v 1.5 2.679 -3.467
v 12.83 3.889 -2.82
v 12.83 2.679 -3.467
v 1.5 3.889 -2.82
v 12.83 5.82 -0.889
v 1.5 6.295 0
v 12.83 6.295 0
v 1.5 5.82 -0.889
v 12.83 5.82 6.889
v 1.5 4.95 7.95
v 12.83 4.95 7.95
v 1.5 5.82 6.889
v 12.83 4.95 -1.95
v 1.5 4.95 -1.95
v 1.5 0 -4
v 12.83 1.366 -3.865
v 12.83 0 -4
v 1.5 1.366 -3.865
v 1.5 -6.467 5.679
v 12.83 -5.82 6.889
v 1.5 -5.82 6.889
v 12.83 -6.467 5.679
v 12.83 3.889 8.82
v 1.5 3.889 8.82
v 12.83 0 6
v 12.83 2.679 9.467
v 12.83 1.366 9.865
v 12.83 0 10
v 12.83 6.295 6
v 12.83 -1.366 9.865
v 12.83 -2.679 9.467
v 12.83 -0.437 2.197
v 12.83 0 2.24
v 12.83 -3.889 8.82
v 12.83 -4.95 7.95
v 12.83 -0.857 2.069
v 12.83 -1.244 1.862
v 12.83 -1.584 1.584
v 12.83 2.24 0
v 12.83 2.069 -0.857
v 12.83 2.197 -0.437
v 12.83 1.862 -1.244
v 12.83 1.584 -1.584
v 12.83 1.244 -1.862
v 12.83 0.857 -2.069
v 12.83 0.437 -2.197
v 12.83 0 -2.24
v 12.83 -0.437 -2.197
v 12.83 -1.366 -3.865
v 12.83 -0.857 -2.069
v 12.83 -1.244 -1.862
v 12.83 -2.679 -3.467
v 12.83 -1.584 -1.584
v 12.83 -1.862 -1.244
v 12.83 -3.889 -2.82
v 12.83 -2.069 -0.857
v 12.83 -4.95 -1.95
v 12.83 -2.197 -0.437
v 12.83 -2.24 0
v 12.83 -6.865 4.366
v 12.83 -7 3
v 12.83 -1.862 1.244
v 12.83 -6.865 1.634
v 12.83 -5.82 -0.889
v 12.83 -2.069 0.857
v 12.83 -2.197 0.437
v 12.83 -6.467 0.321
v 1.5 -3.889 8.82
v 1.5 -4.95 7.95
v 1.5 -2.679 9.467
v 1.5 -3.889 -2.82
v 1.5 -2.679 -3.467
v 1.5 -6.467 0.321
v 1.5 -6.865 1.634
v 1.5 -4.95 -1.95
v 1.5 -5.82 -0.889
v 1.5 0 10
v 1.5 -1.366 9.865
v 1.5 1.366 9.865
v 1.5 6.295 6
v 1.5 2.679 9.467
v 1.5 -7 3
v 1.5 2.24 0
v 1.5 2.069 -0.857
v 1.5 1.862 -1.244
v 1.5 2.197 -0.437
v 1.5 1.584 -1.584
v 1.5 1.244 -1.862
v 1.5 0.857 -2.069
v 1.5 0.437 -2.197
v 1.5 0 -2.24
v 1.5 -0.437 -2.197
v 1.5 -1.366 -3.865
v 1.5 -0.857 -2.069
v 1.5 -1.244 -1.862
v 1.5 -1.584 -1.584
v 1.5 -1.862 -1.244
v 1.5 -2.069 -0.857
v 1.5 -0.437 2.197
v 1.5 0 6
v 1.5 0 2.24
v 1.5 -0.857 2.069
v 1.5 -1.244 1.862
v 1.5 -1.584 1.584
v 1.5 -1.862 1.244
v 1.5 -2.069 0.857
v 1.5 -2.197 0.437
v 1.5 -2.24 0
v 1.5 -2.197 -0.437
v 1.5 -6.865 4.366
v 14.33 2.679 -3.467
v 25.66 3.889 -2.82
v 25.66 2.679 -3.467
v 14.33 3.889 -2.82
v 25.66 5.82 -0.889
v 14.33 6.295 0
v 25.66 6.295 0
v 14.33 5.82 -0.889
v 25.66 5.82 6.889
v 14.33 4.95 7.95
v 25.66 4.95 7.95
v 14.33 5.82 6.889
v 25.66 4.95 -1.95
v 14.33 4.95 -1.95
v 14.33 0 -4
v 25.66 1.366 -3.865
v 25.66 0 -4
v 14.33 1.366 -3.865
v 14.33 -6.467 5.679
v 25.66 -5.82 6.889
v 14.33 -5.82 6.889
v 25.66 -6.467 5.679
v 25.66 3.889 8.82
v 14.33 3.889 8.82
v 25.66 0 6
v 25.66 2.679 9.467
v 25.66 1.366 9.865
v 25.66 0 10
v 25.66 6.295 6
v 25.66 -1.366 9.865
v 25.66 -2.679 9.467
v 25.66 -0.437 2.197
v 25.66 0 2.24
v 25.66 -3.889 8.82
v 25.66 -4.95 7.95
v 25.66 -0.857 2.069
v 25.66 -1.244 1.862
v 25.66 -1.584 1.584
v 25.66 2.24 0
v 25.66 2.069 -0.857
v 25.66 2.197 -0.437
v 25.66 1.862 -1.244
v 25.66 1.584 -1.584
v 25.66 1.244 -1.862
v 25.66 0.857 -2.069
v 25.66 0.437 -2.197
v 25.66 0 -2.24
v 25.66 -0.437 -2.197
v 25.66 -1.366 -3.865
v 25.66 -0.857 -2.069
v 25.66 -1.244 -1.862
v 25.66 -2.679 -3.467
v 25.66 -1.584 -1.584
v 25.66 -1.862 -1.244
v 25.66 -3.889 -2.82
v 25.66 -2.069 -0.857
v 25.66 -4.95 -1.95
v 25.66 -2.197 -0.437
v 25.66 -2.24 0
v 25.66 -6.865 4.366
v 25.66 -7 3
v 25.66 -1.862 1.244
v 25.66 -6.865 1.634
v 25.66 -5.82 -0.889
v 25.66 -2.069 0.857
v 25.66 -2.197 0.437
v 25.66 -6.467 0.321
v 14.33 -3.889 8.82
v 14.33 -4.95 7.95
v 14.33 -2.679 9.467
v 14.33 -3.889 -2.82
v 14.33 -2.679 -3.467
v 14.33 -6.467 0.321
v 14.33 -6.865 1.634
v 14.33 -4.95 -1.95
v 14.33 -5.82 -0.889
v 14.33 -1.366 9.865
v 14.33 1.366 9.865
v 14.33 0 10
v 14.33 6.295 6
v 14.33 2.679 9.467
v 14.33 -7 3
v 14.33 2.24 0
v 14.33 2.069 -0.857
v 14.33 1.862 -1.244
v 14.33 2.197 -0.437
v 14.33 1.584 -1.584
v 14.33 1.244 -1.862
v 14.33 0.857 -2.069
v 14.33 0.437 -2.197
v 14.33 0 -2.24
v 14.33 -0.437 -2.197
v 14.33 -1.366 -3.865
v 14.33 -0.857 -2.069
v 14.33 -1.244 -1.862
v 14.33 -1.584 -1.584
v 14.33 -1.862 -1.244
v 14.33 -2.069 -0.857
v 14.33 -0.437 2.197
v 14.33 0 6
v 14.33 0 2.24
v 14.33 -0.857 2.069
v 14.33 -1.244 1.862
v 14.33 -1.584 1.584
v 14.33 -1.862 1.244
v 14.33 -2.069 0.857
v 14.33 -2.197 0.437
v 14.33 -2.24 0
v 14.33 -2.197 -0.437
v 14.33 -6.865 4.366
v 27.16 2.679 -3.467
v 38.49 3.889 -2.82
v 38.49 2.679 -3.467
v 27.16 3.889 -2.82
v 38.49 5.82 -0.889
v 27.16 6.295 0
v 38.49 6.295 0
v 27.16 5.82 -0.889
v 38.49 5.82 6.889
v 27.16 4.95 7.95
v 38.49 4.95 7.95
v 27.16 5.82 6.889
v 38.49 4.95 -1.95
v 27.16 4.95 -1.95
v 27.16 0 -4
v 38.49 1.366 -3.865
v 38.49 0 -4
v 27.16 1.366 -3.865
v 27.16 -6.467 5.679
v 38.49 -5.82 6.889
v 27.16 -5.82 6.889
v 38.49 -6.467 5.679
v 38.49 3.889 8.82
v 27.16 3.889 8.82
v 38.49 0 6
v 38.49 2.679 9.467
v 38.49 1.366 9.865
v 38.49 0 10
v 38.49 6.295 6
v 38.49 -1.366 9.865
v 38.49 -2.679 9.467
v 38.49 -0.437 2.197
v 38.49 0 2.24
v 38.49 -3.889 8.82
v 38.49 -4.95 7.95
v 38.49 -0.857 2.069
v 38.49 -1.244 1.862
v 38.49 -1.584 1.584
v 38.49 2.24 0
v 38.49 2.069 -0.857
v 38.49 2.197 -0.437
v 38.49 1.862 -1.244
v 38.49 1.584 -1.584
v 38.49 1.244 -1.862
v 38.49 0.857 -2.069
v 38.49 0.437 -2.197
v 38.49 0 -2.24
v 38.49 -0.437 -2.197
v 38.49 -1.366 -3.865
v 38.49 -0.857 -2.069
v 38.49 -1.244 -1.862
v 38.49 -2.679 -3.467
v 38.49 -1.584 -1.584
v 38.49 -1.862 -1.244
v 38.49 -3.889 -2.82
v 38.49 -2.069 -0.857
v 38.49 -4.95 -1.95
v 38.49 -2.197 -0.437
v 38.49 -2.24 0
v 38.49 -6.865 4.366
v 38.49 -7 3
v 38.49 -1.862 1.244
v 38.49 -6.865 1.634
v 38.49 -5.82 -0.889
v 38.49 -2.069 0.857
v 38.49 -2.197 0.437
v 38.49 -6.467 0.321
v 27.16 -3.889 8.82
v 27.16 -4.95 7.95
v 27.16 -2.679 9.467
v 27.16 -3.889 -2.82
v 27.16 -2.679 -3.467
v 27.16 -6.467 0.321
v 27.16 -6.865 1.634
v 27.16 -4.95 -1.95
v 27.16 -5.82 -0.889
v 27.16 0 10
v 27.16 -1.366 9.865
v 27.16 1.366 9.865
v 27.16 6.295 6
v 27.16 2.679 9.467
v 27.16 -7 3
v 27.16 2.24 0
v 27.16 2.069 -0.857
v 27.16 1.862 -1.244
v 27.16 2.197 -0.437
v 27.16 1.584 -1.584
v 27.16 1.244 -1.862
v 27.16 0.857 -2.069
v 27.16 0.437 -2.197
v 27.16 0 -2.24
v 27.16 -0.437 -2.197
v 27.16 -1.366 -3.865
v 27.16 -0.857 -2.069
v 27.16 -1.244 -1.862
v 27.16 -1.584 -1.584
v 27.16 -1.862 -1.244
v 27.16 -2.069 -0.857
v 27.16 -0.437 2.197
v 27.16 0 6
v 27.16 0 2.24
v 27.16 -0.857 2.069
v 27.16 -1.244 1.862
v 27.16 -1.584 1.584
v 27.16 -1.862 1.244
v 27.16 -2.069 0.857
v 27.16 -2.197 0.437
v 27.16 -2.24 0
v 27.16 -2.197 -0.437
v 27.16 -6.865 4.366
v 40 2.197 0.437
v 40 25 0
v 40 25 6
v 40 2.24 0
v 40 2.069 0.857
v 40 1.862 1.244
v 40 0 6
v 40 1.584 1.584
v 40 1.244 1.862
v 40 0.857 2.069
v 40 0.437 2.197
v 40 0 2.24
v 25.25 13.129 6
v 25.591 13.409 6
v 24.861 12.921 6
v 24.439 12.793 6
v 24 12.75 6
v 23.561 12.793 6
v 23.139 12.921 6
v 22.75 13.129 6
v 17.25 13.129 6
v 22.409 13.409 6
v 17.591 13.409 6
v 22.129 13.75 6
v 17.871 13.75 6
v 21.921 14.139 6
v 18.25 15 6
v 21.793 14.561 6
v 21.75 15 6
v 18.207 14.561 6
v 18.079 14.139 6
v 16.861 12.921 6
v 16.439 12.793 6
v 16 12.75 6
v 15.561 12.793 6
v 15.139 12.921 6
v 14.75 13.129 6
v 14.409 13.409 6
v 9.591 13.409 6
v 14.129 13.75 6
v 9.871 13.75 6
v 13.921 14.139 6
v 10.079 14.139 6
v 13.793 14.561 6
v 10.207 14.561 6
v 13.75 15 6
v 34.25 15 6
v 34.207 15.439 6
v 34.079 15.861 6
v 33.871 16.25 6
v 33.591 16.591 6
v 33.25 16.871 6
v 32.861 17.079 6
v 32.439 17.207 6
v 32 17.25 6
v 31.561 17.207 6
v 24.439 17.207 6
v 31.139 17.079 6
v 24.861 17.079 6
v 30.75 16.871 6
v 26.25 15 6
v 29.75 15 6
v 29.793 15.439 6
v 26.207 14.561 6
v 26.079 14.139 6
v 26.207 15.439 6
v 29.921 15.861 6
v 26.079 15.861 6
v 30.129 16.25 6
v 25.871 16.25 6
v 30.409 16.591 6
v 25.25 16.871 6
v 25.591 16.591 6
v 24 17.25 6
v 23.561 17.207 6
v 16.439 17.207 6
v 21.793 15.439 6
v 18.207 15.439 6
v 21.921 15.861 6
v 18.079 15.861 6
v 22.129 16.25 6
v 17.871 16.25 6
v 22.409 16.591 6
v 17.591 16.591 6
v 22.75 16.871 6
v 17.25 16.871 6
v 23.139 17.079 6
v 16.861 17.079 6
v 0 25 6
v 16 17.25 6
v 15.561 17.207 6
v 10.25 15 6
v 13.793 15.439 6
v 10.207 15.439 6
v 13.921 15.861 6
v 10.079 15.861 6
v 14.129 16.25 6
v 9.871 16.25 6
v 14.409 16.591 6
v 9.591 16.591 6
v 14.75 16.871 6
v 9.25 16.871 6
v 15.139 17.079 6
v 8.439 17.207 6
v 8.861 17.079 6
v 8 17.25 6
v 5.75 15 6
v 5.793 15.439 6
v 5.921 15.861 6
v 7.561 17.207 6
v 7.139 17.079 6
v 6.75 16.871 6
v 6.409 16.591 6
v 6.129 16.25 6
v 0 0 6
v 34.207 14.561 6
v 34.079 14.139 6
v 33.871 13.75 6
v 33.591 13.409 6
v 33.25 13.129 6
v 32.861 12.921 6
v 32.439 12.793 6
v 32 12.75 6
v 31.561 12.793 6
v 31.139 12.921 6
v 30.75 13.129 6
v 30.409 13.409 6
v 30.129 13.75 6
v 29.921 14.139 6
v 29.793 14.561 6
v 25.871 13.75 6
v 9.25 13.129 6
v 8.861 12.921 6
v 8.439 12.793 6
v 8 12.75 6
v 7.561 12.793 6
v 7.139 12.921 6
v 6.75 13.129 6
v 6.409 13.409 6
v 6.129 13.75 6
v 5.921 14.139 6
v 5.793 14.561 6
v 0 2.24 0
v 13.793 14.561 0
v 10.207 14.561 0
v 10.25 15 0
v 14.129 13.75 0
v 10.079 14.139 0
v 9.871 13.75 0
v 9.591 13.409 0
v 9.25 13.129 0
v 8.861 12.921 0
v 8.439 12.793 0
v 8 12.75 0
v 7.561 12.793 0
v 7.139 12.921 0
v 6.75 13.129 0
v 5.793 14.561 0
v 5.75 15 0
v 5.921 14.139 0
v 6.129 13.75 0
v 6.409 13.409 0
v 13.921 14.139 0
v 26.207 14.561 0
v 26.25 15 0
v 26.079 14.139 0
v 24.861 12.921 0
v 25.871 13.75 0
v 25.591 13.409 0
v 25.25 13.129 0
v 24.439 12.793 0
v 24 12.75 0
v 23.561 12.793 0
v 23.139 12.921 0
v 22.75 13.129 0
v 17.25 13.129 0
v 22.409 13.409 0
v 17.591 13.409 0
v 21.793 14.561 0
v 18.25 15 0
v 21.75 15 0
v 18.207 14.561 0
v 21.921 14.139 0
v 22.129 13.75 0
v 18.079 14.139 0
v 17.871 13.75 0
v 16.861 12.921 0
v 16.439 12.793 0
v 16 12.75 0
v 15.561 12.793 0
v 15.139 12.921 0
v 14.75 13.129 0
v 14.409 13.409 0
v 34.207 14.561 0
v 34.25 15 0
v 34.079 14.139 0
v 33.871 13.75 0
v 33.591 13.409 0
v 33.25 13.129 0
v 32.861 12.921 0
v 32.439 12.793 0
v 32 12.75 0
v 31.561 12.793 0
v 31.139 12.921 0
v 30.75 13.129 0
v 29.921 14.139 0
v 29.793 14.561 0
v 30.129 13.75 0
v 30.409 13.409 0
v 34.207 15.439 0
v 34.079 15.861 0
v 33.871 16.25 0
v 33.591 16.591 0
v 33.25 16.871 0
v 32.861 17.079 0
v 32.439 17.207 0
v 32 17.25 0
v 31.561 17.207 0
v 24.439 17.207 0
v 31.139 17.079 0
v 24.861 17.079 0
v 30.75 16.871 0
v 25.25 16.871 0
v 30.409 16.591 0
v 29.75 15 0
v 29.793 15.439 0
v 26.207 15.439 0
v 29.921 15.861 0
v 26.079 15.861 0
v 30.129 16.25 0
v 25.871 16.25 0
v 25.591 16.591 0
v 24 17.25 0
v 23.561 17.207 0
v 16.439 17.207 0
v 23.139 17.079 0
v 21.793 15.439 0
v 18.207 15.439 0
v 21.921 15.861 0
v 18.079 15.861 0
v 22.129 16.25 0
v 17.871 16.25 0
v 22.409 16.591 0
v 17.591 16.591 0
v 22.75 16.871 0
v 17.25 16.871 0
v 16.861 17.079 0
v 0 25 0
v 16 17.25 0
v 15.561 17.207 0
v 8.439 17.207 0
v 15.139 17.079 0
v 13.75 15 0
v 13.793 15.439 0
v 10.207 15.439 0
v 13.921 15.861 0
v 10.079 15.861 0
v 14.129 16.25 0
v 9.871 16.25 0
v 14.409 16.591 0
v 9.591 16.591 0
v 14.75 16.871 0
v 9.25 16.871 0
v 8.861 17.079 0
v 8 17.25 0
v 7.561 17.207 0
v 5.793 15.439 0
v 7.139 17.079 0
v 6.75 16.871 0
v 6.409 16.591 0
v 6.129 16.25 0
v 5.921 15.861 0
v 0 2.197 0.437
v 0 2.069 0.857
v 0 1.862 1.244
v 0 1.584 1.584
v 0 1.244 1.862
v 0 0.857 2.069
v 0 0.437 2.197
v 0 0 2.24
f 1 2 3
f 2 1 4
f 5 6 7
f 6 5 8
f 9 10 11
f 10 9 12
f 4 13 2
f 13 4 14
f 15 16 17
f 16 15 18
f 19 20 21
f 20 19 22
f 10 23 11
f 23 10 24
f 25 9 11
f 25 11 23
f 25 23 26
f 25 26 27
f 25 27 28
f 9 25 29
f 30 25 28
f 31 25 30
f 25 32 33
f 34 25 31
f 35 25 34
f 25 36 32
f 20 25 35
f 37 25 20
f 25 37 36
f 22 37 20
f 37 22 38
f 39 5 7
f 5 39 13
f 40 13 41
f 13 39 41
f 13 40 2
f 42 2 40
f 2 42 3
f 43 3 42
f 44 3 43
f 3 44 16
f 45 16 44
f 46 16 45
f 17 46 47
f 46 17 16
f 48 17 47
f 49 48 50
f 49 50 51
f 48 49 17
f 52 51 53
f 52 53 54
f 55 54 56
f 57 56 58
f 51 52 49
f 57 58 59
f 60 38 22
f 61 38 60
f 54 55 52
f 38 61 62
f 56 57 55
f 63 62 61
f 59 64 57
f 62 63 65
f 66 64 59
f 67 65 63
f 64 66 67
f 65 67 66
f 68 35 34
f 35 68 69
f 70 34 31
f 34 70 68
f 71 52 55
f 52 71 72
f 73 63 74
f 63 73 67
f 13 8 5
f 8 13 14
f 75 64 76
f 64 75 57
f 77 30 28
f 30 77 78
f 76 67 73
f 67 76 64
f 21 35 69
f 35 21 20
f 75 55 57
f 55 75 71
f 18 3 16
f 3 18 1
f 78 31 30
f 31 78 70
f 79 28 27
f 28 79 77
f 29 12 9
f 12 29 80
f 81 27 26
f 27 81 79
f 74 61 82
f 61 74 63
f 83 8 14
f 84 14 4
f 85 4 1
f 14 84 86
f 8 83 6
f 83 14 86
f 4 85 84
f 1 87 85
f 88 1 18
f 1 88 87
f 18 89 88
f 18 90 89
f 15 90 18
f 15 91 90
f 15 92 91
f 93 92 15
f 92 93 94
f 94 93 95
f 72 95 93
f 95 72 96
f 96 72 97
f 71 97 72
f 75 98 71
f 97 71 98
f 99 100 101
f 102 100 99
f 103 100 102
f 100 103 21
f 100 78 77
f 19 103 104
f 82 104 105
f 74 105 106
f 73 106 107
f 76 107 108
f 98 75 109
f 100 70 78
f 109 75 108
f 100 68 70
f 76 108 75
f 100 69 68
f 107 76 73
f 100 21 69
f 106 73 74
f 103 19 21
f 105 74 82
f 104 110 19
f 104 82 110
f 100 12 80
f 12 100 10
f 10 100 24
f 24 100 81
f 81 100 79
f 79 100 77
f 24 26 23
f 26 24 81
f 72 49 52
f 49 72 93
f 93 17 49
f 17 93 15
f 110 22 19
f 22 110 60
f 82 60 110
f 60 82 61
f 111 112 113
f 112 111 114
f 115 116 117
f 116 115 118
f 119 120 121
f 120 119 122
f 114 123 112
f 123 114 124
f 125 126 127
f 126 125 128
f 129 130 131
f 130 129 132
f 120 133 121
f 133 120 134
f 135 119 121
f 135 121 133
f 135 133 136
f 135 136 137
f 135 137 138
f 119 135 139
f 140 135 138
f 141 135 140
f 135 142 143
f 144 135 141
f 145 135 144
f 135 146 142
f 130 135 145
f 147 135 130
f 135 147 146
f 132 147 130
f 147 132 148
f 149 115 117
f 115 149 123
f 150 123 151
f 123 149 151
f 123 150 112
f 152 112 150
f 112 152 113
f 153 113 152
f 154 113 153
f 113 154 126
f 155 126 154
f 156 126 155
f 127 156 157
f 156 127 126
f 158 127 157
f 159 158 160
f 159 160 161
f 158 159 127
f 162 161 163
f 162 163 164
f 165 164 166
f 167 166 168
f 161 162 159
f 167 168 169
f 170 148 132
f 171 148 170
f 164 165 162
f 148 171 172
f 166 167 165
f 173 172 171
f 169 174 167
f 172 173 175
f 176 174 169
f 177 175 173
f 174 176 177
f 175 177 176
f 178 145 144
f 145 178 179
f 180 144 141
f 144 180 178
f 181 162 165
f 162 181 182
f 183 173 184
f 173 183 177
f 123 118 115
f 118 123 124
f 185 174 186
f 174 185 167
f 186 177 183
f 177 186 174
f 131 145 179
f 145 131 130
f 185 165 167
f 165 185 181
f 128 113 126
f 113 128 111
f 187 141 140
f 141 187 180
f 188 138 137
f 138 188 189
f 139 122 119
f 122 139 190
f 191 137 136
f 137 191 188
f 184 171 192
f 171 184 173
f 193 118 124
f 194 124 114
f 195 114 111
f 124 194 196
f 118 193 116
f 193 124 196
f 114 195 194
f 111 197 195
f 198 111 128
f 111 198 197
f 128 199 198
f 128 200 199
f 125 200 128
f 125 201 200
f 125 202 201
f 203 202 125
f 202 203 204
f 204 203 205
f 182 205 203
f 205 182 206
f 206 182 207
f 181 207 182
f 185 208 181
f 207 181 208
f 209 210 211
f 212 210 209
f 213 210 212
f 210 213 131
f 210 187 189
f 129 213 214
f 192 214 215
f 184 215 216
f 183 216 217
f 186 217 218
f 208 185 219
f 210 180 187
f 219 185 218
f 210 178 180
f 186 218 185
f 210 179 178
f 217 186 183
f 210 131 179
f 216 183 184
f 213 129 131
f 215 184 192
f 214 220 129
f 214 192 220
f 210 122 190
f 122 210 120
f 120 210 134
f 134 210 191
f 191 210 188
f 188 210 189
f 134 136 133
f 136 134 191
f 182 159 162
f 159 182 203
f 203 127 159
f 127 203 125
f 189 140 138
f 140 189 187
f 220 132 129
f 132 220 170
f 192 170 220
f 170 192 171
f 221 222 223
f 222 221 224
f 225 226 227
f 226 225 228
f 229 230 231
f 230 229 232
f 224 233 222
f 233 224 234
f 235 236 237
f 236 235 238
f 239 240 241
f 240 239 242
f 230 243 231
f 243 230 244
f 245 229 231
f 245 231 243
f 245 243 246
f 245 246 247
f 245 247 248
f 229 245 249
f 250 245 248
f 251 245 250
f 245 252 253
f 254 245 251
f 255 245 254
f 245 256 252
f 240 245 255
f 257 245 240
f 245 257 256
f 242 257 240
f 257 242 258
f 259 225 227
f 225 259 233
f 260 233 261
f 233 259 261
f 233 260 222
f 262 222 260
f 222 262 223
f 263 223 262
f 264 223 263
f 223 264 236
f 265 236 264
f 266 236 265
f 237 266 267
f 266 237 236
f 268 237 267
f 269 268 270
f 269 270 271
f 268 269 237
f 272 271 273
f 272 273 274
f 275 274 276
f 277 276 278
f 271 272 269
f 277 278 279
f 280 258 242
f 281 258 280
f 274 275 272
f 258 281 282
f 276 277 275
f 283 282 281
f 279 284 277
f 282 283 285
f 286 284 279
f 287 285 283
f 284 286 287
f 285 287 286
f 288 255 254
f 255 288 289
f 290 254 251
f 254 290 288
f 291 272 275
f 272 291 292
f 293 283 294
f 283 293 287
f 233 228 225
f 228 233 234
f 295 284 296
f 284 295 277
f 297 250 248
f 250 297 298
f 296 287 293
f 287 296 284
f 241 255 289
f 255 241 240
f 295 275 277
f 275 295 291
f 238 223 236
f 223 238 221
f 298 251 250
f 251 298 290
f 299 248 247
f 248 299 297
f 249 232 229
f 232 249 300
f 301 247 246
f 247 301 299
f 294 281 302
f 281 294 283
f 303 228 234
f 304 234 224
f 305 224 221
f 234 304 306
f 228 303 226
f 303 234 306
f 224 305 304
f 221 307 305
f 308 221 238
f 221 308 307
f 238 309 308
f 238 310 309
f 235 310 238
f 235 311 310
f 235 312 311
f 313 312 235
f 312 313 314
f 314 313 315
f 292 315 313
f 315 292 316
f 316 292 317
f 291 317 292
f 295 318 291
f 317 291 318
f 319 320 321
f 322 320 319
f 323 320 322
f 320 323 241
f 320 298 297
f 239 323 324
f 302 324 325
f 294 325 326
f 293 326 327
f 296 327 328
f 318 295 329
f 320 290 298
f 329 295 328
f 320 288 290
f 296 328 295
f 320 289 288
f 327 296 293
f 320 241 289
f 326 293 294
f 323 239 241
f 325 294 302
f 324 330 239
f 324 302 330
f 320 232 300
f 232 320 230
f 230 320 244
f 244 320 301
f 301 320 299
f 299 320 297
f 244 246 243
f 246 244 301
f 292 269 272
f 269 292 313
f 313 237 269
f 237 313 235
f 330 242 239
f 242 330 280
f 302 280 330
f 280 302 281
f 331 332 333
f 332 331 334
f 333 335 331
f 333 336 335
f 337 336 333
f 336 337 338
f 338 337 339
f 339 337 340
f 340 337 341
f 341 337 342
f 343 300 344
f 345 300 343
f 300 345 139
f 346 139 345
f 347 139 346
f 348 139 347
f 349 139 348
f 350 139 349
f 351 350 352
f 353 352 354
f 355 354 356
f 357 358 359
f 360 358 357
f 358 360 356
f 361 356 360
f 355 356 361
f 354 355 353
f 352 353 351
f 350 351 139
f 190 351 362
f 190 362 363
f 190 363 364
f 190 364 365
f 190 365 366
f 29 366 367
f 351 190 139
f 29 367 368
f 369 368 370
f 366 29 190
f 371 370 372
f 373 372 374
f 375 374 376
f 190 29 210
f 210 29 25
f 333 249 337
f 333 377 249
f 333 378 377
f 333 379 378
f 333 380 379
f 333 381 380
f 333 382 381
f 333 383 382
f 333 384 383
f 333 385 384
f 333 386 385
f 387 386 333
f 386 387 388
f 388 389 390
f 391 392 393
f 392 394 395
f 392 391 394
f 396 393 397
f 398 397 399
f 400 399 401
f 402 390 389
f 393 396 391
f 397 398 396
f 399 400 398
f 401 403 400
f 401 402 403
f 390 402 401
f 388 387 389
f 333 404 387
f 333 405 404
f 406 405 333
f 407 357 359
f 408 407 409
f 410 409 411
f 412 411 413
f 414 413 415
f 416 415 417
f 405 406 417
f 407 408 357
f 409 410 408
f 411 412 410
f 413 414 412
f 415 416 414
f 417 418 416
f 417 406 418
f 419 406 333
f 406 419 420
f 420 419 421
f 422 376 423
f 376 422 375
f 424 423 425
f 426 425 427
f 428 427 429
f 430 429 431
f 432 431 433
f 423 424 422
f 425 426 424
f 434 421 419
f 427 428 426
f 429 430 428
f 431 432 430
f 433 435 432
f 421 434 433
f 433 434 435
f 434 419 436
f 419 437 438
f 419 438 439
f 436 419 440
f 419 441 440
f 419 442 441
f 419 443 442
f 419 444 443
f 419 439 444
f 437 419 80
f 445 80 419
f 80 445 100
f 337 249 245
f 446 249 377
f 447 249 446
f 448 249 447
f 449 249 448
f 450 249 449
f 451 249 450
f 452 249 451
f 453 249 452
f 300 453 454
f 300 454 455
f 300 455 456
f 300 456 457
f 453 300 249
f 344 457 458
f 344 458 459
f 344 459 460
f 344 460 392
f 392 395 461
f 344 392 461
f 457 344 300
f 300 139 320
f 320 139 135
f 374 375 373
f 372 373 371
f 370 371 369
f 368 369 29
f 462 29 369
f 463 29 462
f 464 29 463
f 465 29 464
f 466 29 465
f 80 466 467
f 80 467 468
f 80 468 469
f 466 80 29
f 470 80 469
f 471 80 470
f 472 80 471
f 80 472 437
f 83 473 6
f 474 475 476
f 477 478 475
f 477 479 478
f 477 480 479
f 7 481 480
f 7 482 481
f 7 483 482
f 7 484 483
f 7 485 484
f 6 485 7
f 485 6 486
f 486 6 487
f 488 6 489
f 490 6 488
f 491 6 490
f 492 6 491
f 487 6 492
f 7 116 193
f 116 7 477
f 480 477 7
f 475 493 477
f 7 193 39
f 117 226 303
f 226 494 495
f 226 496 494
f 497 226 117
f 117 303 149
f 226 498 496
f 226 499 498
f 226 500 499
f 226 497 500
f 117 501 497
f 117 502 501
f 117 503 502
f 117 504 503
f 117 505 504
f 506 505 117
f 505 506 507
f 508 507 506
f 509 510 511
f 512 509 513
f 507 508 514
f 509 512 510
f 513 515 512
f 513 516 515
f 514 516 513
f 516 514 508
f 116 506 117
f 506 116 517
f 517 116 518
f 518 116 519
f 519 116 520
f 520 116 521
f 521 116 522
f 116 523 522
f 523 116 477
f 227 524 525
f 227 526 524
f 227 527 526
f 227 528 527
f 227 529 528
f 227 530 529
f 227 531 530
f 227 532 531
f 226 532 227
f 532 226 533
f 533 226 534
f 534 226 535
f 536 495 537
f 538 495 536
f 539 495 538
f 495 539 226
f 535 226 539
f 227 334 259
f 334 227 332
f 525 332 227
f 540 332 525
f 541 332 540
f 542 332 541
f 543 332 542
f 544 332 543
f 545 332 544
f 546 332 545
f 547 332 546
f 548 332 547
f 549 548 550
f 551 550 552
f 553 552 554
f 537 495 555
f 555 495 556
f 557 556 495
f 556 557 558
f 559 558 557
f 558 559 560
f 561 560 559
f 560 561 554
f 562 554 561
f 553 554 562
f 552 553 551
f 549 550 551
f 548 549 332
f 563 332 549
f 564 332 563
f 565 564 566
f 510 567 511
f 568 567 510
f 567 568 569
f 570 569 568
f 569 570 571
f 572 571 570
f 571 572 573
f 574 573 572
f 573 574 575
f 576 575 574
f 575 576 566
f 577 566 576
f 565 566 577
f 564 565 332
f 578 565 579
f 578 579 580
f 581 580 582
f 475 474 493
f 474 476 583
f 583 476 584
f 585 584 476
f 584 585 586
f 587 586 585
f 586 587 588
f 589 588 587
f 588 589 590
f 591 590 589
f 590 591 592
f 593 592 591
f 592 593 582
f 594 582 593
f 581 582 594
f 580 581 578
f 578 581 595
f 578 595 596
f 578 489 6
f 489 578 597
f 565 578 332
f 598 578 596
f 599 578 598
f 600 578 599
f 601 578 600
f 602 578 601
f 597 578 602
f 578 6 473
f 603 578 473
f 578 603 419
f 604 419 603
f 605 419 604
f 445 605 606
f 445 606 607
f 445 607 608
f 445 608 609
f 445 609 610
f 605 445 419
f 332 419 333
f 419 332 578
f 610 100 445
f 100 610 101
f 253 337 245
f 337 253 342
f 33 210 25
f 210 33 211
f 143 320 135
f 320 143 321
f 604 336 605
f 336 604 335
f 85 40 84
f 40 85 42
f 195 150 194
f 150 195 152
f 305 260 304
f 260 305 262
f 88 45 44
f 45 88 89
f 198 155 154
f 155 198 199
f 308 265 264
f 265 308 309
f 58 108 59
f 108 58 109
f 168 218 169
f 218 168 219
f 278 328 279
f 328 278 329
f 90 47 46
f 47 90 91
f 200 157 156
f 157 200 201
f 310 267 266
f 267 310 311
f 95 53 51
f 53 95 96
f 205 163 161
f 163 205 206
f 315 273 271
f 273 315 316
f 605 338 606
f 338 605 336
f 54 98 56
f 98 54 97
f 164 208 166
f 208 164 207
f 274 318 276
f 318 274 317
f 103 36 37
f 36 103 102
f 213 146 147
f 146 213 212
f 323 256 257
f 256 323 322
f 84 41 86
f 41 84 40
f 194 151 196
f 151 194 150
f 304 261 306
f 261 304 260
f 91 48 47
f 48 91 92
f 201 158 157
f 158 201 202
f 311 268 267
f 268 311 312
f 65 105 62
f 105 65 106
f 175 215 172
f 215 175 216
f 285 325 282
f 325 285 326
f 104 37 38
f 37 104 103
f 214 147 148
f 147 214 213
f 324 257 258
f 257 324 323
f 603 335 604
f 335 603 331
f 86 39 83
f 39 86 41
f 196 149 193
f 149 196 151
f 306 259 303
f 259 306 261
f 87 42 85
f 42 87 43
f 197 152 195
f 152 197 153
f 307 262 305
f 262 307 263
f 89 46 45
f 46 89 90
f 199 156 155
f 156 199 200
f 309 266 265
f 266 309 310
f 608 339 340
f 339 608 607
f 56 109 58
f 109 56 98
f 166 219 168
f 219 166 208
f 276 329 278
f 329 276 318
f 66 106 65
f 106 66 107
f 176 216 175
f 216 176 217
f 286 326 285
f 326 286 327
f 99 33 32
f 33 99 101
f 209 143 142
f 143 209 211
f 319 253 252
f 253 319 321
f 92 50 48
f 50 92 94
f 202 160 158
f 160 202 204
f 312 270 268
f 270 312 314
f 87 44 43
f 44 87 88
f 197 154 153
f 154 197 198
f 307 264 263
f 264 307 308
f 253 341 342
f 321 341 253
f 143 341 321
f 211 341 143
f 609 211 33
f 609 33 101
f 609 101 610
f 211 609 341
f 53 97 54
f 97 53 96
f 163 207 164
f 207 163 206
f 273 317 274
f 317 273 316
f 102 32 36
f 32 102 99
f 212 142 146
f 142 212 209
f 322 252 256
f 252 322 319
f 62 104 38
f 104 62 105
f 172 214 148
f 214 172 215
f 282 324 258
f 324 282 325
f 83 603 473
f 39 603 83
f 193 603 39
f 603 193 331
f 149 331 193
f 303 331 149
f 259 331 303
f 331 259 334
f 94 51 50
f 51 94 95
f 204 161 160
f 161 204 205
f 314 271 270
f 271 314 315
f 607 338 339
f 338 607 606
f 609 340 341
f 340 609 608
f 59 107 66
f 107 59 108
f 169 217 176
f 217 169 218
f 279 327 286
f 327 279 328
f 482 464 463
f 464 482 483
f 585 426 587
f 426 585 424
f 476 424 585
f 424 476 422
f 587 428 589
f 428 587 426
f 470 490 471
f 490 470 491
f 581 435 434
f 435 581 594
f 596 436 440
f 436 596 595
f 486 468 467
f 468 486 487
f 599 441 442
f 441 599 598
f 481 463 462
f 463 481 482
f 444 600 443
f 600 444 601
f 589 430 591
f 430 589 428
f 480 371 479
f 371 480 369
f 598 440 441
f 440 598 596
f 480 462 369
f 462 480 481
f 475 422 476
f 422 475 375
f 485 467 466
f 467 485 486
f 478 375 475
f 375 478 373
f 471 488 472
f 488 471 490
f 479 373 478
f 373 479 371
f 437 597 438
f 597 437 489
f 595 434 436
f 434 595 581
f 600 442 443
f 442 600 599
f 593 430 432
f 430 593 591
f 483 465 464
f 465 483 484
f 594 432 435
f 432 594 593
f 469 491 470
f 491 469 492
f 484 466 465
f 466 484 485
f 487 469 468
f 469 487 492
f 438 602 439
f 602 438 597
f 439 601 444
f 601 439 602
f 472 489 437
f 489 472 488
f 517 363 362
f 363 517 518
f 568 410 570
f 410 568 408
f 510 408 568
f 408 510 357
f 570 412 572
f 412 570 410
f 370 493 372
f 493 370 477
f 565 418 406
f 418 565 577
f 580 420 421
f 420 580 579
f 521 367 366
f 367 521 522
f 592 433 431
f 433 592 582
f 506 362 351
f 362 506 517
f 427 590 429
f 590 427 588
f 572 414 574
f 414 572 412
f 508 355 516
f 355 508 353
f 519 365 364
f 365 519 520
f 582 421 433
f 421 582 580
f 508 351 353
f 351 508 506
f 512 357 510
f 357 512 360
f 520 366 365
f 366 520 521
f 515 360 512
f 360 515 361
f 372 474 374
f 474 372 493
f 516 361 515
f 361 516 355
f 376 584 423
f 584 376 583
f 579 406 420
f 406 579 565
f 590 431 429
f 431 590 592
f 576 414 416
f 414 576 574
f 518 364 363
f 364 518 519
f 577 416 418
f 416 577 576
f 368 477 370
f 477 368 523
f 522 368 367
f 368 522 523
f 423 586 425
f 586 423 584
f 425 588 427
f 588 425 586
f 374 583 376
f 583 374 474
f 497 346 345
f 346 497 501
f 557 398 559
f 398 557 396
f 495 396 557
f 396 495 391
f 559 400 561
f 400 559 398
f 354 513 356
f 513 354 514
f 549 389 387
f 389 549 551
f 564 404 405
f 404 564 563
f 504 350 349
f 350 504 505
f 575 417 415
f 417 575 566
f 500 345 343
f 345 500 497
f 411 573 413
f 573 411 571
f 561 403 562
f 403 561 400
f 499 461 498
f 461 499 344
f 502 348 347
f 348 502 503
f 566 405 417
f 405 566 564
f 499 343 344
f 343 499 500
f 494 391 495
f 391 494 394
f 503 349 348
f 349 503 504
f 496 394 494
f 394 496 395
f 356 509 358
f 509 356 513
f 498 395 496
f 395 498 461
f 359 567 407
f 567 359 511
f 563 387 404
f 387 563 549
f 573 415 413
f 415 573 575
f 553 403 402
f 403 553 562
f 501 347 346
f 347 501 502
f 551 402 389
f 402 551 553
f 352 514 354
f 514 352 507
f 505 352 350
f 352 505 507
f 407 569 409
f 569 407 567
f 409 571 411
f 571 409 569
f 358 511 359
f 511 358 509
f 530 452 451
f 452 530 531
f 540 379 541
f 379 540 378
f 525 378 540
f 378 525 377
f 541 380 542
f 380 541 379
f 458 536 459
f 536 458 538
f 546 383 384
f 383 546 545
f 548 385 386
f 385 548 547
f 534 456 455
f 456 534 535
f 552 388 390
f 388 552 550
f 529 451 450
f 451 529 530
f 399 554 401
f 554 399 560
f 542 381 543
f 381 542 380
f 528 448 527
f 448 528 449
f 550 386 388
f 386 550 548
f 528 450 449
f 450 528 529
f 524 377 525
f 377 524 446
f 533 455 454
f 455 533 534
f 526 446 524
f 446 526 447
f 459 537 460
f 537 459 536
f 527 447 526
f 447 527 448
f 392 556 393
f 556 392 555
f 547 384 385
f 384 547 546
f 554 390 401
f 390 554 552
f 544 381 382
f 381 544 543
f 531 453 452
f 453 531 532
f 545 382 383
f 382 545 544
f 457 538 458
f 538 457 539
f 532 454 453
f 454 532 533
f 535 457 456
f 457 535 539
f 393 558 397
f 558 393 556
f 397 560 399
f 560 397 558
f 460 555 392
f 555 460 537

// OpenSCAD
$fn = 32;

// ----------------------------------------------------------------------
// Hinge leaf: 40 x 32 x 14 mm
// ----------------------------------------------------------------------

// --- parameters (mm) ---
leaf_len = 40;            // leaf length, X
leaf_w = 25;              // leaf width, Y
leaf_t = 6;               // leaf thickness
knuckle_d = 14;           // knuckle diameter
knuckle_w = 11.33;        // knuckle width
knuckle_n = 3;            // number of knuckles
pin_d = 4.48;             // pin bore
gap = 1.5;                // gap between the knuckles
screw_d = 4.5;            // screw clearance

module leaf() {
  cube([leaf_len, leaf_w, leaf_t]);
}

module knuckles() {
  /* barrels sit on the leaf edge, the pin axis at half the leaf thickness */
  for (i = [0 : knuckle_n - 1])
    translate([gap + i * (knuckle_w + gap), 0, leaf_t * 0.5])
      rotate([0, 90, 0]) cylinder(h = knuckle_w, d = knuckle_d);
}

difference() {
  union() {
    leaf();
    knuckles();
  }
  rotate([0, 90, 0]) translate([0, 0, -1])
    cylinder(h = leaf_len + 2, d = pin_d);
  translate([8, leaf_w * 0.6, -1]) cylinder(h = leaf_t + 2, d = screw_d);
  translate([16, leaf_w * 0.6, -1]) cylinder(h = leaf_t + 2, d = screw_d);
  translate([24, leaf_w * 0.6, -1]) cylinder(h = leaf_t + 2, d = screw_d);
  translate([32, leaf_w * 0.6, -1]) cylinder(h = leaf_t + 2, d = screw_d);
}
